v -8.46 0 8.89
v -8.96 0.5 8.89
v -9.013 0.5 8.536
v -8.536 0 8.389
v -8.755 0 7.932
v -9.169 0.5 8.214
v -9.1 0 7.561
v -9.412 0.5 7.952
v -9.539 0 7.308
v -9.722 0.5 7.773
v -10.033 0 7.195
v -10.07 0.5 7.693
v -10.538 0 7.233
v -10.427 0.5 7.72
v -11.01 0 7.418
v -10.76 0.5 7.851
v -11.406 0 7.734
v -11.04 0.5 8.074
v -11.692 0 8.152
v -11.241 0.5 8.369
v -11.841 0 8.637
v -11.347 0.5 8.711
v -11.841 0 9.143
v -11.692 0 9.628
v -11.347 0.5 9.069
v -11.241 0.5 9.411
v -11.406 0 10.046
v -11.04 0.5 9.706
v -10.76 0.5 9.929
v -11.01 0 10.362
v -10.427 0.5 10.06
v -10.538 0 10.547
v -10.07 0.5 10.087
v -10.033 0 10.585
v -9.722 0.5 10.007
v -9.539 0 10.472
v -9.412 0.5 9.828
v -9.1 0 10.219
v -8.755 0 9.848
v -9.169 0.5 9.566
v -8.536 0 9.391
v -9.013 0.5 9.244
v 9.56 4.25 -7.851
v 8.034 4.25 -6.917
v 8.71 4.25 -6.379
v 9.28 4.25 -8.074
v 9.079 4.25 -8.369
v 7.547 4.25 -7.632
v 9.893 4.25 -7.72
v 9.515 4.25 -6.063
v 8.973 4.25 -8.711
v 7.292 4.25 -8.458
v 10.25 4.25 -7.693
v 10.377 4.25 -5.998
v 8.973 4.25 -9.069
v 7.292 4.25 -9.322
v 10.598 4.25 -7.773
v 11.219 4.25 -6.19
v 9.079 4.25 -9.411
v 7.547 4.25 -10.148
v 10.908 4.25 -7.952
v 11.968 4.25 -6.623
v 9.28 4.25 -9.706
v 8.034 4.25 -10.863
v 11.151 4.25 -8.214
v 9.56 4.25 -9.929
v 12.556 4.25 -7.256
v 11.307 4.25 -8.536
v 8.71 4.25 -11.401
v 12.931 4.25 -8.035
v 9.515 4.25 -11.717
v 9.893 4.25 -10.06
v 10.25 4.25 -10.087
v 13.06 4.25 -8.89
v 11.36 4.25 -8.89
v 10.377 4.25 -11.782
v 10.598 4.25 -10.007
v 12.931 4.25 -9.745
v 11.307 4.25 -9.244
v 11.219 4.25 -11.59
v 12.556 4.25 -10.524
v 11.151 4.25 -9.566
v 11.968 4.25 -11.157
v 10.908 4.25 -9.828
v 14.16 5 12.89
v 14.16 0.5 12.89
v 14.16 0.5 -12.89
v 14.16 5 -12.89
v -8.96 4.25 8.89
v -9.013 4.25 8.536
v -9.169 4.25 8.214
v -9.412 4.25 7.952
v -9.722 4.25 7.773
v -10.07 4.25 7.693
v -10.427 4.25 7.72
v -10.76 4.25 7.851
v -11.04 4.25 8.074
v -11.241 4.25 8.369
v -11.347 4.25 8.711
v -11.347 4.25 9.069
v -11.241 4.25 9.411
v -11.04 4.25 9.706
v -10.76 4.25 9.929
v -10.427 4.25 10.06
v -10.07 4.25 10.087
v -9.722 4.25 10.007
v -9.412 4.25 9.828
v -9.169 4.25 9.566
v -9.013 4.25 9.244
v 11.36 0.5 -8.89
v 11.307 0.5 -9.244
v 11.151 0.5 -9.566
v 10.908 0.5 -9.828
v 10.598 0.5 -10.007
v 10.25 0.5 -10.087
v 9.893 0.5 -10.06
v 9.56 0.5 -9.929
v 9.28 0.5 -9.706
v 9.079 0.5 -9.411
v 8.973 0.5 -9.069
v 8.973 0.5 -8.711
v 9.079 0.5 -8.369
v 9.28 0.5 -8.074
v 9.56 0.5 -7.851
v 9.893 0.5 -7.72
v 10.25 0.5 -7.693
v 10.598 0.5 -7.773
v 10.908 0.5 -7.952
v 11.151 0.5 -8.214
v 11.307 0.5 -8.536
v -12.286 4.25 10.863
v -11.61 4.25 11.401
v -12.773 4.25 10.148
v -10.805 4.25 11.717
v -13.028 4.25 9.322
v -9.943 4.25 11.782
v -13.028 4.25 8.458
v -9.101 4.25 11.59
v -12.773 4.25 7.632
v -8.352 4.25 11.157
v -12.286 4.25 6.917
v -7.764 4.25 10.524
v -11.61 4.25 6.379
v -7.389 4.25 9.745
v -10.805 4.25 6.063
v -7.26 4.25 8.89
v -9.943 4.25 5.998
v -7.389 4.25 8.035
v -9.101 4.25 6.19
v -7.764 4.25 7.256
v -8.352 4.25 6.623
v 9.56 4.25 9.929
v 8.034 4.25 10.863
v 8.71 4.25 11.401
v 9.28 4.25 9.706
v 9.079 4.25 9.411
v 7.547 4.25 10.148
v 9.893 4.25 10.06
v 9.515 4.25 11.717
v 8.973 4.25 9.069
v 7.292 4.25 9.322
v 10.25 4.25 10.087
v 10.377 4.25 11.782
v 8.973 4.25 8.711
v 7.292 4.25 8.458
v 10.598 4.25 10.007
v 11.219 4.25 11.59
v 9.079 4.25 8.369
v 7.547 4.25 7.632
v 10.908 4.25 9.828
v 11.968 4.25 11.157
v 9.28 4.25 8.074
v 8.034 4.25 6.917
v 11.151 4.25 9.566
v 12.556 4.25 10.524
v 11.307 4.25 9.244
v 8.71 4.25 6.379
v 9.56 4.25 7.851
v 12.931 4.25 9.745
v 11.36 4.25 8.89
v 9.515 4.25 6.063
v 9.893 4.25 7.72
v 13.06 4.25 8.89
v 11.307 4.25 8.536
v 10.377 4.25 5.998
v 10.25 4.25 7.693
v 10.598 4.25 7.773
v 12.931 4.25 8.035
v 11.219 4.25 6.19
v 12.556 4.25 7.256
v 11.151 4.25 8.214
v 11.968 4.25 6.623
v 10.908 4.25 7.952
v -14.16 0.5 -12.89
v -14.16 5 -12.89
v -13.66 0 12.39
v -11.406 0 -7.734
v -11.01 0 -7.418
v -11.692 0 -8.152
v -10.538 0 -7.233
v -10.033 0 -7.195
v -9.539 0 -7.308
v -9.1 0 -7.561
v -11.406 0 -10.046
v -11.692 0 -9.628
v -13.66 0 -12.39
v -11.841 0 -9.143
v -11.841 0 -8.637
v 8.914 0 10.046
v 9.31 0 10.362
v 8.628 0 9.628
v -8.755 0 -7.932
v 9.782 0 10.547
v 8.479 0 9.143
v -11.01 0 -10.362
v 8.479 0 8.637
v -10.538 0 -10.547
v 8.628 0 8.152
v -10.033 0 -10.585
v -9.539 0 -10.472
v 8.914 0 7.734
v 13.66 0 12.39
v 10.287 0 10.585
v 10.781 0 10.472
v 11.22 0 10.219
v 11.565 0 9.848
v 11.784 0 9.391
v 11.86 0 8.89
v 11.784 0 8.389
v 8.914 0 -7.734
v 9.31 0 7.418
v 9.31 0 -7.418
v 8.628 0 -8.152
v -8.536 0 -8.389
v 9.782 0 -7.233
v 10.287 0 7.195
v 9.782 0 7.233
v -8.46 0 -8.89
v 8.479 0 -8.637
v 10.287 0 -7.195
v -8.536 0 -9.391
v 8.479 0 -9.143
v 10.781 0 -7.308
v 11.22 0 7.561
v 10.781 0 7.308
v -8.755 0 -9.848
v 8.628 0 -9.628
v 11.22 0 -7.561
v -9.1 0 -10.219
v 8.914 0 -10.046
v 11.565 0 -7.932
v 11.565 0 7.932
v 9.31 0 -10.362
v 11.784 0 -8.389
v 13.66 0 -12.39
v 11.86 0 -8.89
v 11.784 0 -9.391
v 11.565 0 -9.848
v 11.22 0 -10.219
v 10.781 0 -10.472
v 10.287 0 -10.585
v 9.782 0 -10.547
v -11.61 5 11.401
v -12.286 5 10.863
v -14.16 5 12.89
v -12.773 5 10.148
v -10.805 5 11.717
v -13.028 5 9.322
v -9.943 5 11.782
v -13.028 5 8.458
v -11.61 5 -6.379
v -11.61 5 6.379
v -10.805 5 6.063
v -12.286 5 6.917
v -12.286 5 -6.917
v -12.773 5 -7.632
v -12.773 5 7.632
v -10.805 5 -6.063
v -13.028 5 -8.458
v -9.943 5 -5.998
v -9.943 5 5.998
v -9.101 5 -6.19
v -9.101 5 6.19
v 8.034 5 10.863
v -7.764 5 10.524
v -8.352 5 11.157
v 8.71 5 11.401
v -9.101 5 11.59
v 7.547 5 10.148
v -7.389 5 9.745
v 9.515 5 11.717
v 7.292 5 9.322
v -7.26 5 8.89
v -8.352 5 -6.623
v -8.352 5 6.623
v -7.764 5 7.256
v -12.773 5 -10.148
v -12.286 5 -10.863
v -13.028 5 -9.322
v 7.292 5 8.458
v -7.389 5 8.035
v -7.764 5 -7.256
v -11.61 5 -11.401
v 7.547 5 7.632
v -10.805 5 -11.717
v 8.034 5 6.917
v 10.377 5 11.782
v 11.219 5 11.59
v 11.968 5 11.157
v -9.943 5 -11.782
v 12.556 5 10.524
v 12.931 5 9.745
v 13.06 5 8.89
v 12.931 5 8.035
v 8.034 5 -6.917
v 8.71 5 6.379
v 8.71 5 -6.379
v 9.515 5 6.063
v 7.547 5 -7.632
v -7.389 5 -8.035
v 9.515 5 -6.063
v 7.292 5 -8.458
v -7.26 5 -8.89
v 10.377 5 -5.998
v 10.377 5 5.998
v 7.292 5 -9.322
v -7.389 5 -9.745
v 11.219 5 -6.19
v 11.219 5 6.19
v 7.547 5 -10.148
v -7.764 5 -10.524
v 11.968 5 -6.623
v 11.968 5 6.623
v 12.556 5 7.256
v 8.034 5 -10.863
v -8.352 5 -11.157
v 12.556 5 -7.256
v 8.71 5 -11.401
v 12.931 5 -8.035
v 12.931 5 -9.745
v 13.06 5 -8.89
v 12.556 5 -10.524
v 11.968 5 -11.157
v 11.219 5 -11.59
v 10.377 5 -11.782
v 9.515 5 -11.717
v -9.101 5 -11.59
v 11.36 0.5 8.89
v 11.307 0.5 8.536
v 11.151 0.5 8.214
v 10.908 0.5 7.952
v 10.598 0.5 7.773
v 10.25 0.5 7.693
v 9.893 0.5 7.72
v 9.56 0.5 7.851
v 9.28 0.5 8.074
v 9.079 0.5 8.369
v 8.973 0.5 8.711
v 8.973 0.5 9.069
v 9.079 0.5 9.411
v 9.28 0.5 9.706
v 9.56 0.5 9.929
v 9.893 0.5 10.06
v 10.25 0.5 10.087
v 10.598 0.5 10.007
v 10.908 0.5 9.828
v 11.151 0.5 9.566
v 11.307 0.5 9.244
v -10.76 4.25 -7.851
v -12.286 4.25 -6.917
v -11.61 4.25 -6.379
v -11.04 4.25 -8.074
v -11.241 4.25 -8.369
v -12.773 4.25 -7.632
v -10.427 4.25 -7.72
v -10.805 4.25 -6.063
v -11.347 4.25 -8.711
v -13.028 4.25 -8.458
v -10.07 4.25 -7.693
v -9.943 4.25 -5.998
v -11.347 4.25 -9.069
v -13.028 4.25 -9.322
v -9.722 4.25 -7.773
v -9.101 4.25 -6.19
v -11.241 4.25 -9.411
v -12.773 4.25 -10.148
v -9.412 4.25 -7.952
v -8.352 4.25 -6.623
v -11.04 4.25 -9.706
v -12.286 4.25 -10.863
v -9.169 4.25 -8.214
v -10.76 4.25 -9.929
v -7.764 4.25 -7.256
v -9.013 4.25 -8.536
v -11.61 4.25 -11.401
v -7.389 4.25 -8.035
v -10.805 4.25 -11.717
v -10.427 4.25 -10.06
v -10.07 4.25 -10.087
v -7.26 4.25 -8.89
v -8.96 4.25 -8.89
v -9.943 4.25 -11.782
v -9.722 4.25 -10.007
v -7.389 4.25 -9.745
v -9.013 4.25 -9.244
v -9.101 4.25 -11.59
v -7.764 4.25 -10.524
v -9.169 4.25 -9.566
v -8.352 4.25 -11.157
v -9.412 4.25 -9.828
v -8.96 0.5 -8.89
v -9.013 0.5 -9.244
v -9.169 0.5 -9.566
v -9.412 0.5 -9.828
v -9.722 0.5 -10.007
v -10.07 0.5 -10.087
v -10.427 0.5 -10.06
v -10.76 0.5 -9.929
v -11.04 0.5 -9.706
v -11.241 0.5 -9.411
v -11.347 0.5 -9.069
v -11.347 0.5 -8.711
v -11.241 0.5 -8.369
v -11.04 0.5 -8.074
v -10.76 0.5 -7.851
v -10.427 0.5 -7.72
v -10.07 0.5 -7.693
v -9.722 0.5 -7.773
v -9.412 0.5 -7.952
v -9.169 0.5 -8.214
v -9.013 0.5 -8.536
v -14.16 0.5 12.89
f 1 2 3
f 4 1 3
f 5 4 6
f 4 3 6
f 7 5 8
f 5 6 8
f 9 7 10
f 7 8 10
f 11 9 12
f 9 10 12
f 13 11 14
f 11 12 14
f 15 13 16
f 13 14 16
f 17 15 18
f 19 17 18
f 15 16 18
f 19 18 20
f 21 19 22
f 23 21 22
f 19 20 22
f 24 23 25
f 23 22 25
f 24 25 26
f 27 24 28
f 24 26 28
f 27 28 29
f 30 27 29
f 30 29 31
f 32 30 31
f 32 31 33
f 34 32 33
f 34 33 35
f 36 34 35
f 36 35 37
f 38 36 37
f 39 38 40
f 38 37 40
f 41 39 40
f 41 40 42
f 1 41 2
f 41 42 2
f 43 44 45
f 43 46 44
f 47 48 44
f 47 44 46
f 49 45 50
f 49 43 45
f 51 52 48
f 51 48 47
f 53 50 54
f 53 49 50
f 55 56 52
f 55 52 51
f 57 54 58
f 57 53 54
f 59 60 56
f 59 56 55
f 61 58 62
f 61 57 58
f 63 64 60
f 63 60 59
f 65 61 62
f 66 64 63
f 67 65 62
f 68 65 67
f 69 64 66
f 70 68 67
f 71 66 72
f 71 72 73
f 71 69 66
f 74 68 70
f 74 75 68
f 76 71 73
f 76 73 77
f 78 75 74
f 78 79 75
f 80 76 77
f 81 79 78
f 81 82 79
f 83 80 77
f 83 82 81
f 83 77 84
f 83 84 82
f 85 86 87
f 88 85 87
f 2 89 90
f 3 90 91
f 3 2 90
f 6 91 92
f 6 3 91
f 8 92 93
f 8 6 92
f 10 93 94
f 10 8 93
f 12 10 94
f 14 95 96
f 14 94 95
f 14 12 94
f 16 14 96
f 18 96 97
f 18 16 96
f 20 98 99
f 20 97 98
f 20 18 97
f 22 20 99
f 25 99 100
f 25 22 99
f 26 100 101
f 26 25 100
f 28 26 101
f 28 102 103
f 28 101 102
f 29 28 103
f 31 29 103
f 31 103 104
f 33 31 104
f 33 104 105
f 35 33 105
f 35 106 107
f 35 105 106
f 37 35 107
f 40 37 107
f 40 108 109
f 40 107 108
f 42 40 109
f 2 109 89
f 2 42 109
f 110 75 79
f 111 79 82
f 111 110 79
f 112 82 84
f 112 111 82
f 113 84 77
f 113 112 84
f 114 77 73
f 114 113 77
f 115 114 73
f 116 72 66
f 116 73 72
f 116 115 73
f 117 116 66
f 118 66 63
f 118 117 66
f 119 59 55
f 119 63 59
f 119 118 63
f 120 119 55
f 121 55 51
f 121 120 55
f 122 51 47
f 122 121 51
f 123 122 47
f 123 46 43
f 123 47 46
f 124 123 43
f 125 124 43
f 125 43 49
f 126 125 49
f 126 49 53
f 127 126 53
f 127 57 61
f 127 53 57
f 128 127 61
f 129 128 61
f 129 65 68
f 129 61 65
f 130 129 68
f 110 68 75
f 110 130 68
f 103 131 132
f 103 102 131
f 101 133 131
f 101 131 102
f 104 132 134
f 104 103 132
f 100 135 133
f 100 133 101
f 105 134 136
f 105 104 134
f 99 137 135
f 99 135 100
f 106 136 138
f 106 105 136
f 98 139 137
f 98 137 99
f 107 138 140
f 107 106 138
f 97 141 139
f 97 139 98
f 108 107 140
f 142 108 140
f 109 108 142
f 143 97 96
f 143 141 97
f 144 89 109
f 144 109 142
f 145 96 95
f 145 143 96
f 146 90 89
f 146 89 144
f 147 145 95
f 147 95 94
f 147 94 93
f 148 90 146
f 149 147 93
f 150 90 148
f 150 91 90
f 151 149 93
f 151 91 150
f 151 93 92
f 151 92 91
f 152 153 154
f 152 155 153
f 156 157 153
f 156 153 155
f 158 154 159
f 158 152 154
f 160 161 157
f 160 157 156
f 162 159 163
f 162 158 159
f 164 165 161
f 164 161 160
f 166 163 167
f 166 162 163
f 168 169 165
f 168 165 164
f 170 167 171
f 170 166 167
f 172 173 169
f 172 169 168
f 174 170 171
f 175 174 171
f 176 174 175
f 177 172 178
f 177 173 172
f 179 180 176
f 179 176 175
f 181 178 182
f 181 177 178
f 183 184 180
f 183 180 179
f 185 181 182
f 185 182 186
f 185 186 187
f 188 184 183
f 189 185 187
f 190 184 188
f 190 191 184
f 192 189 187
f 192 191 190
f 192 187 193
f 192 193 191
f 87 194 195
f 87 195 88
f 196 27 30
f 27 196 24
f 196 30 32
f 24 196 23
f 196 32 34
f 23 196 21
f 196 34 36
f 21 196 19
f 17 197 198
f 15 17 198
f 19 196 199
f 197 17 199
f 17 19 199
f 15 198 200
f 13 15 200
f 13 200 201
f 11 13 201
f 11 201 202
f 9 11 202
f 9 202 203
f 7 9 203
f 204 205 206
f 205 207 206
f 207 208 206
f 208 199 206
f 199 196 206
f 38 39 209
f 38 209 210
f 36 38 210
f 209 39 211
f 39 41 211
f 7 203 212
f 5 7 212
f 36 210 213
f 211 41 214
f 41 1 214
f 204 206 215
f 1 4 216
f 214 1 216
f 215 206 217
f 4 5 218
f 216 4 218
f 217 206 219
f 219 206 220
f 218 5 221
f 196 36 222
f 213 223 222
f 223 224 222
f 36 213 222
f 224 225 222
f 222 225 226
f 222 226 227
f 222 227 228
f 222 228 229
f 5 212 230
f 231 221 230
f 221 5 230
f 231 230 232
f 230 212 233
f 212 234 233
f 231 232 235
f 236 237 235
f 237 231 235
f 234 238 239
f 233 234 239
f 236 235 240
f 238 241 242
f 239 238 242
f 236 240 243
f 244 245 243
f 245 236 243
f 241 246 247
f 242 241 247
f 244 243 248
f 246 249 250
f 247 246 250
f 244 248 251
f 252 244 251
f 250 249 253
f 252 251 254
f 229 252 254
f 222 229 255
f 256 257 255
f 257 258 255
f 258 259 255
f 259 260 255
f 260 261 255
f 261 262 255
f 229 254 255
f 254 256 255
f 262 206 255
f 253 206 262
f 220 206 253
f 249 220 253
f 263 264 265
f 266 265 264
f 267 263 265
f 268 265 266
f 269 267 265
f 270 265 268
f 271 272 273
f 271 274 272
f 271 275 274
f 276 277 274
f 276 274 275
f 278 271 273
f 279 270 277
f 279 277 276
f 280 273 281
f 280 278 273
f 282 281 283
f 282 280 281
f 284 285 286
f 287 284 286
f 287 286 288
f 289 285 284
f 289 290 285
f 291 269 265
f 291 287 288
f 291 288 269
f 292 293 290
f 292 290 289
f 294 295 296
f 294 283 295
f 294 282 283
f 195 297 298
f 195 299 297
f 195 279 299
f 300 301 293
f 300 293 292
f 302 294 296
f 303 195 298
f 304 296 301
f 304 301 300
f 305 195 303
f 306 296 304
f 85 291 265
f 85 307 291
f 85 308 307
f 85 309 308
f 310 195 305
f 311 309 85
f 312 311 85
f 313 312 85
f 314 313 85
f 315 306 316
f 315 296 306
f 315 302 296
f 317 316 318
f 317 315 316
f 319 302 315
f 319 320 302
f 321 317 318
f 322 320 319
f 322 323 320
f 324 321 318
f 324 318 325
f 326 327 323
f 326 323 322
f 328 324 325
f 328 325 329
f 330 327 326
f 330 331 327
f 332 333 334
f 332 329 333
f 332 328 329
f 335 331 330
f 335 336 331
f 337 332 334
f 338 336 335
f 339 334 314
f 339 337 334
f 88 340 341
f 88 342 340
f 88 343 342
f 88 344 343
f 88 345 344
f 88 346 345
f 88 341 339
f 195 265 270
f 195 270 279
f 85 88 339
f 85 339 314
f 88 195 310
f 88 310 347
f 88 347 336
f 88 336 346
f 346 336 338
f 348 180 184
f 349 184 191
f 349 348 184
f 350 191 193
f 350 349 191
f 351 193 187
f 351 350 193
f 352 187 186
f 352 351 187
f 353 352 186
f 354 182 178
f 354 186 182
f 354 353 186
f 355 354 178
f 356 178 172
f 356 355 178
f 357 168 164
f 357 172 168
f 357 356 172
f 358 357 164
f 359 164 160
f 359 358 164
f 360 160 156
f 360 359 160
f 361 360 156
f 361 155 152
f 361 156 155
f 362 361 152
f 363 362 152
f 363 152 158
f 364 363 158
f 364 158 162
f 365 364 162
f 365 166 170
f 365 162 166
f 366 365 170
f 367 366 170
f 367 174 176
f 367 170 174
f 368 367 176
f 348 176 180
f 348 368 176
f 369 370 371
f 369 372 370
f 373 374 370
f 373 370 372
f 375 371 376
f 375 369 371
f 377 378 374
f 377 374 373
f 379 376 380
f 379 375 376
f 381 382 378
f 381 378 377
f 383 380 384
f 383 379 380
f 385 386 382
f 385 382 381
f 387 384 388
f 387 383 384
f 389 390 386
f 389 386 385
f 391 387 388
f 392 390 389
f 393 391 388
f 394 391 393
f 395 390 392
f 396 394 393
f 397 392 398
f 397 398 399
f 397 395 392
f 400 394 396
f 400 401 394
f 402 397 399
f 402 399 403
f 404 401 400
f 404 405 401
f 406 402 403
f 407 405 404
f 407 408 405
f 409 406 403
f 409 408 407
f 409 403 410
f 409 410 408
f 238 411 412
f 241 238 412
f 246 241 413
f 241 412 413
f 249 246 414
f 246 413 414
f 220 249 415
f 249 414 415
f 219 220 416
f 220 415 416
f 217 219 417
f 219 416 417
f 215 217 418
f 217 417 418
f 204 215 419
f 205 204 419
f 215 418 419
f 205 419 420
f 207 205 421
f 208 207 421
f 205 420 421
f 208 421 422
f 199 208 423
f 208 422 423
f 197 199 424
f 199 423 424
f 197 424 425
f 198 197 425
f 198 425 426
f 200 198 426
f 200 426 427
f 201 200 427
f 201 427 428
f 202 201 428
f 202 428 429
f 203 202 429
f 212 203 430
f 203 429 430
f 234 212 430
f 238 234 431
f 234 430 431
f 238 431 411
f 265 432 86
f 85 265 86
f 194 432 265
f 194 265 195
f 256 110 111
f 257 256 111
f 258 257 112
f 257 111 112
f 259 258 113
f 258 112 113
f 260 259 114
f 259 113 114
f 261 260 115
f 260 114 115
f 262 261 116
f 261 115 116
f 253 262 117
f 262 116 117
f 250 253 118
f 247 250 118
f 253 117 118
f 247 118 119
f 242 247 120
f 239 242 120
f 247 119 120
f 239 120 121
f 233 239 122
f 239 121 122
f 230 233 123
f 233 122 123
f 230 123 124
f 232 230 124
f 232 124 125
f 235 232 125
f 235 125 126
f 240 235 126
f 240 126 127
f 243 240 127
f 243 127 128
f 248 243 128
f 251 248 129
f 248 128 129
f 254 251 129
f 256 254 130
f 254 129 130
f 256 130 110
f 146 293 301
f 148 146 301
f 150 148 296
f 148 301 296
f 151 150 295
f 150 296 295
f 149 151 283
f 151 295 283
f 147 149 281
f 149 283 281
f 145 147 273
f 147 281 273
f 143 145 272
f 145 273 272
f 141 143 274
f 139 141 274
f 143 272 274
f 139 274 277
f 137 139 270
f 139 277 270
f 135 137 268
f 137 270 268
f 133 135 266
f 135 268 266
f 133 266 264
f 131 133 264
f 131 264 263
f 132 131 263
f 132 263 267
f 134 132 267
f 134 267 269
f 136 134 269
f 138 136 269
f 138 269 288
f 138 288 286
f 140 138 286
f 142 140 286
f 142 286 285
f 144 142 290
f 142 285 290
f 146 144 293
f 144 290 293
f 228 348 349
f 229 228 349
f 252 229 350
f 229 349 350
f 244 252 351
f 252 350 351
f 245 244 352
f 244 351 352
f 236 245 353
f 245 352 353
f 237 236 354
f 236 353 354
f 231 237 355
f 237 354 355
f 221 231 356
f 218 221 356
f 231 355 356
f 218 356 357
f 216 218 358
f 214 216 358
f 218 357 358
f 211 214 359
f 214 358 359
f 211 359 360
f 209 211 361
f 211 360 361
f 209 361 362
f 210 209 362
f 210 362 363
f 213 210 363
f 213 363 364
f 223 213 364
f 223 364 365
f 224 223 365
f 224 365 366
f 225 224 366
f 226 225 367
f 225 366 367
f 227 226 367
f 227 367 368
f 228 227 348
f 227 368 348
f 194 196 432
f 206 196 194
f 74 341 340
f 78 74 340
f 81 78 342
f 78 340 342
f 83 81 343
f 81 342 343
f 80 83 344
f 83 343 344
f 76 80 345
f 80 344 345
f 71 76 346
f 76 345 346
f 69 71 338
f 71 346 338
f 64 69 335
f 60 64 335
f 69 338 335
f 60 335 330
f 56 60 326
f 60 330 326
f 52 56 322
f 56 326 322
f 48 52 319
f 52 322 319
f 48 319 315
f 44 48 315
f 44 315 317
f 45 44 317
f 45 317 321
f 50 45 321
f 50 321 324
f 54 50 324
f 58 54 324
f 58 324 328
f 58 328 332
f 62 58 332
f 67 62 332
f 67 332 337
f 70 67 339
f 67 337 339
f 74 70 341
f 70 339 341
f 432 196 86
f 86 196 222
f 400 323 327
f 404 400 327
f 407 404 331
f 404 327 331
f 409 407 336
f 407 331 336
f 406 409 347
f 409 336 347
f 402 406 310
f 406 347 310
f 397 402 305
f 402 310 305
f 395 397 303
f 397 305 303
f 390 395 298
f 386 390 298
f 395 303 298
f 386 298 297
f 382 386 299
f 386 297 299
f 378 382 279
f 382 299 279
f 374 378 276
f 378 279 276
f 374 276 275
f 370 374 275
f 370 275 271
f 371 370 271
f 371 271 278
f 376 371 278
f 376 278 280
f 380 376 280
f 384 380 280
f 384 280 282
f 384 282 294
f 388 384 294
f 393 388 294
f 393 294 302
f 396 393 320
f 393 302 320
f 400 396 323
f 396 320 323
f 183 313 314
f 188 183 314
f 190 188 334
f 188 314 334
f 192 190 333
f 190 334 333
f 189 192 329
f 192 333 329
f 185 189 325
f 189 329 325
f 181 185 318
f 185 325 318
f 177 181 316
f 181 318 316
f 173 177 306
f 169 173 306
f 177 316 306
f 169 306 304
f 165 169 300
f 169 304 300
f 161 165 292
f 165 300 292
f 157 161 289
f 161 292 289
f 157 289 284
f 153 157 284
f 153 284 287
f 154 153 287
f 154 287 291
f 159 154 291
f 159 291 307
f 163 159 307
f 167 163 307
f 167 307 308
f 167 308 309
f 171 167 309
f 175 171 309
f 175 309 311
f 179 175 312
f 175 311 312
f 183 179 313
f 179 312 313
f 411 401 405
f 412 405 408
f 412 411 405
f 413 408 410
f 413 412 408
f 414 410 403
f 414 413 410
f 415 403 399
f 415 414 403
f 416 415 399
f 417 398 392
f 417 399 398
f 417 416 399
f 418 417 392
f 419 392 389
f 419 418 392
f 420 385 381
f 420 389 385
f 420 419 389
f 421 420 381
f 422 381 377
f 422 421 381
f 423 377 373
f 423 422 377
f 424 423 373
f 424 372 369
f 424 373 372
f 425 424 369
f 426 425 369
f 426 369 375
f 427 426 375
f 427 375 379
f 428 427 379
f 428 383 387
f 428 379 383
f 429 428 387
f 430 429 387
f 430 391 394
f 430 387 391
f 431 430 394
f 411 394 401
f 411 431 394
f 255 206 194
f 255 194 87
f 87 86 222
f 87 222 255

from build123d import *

# Parameters (mm, degrees)
SKETCH1_W           = 28.32
SKETCH1_H           = 25.78
SKETCH1_R           = 1.2
BOSS_EXTRUDE1_DEPTH = 5
SKETCH3_R           = 2.9
CUT_EXTRUDE1_DEPTH  = 0.75
CHAMFER1_SIZE       = 0.5


with BuildPart() as part:
    # Sketch1 → Boss-Extrude1 (new body)
    with BuildSketch(Plane(origin=(0, 0, 0), x_dir=(1, 0, 0), z_dir=(0, 1, 0))):
        Rectangle(SKETCH1_W, SKETCH1_H)
        with Locations((-10.16, 8.89)):
            Circle(SKETCH1_R, mode=Mode.SUBTRACT)
        with Locations((10.16, 8.89)):
            Circle(SKETCH1_R, mode=Mode.SUBTRACT)
        with Locations((10.16, -8.89)):
            Circle(SKETCH1_R, mode=Mode.SUBTRACT)
        with Locations((-10.16, -8.89)):
            Circle(SKETCH1_R, mode=Mode.SUBTRACT)
    extrude(amount=BOSS_EXTRUDE1_DEPTH)

    # Sketch3 → Cut-Extrude1 (cut)
    with BuildSketch(Plane(origin=(0, 5, 0), x_dir=(1, 0, 0), z_dir=(0, 1, 0))):
        with Locations((-10.16, 8.89)):
            Circle(SKETCH3_R)
        with Locations((10.16, 8.89)):
            Circle(SKETCH3_R)
        with Locations((10.16, -8.89)):
            Circle(SKETCH3_R)
        with Locations((-10.16, -8.89)):
            Circle(SKETCH3_R)
    extrude(amount=-CUT_EXTRUDE1_DEPTH, mode=Mode.SUBTRACT)

    # Chamfer1
    chamfer1_edges = [part.edges().sort_by_distance(p)[0] for p in [
        (-11.36, 0, -8.89),
        (8.96, 0, -8.89),
        (8.96, 0, 8.89),
        (-11.36, 0, 8.89),
        (-14.16, 0, 0),
        (0, 0, -12.89),
        (14.16, 0, 0),
        (0, 0, 12.89),
    ]]
    chamfer(chamfer1_edges, length=CHAMFER1_SIZE)


solid = part.part
